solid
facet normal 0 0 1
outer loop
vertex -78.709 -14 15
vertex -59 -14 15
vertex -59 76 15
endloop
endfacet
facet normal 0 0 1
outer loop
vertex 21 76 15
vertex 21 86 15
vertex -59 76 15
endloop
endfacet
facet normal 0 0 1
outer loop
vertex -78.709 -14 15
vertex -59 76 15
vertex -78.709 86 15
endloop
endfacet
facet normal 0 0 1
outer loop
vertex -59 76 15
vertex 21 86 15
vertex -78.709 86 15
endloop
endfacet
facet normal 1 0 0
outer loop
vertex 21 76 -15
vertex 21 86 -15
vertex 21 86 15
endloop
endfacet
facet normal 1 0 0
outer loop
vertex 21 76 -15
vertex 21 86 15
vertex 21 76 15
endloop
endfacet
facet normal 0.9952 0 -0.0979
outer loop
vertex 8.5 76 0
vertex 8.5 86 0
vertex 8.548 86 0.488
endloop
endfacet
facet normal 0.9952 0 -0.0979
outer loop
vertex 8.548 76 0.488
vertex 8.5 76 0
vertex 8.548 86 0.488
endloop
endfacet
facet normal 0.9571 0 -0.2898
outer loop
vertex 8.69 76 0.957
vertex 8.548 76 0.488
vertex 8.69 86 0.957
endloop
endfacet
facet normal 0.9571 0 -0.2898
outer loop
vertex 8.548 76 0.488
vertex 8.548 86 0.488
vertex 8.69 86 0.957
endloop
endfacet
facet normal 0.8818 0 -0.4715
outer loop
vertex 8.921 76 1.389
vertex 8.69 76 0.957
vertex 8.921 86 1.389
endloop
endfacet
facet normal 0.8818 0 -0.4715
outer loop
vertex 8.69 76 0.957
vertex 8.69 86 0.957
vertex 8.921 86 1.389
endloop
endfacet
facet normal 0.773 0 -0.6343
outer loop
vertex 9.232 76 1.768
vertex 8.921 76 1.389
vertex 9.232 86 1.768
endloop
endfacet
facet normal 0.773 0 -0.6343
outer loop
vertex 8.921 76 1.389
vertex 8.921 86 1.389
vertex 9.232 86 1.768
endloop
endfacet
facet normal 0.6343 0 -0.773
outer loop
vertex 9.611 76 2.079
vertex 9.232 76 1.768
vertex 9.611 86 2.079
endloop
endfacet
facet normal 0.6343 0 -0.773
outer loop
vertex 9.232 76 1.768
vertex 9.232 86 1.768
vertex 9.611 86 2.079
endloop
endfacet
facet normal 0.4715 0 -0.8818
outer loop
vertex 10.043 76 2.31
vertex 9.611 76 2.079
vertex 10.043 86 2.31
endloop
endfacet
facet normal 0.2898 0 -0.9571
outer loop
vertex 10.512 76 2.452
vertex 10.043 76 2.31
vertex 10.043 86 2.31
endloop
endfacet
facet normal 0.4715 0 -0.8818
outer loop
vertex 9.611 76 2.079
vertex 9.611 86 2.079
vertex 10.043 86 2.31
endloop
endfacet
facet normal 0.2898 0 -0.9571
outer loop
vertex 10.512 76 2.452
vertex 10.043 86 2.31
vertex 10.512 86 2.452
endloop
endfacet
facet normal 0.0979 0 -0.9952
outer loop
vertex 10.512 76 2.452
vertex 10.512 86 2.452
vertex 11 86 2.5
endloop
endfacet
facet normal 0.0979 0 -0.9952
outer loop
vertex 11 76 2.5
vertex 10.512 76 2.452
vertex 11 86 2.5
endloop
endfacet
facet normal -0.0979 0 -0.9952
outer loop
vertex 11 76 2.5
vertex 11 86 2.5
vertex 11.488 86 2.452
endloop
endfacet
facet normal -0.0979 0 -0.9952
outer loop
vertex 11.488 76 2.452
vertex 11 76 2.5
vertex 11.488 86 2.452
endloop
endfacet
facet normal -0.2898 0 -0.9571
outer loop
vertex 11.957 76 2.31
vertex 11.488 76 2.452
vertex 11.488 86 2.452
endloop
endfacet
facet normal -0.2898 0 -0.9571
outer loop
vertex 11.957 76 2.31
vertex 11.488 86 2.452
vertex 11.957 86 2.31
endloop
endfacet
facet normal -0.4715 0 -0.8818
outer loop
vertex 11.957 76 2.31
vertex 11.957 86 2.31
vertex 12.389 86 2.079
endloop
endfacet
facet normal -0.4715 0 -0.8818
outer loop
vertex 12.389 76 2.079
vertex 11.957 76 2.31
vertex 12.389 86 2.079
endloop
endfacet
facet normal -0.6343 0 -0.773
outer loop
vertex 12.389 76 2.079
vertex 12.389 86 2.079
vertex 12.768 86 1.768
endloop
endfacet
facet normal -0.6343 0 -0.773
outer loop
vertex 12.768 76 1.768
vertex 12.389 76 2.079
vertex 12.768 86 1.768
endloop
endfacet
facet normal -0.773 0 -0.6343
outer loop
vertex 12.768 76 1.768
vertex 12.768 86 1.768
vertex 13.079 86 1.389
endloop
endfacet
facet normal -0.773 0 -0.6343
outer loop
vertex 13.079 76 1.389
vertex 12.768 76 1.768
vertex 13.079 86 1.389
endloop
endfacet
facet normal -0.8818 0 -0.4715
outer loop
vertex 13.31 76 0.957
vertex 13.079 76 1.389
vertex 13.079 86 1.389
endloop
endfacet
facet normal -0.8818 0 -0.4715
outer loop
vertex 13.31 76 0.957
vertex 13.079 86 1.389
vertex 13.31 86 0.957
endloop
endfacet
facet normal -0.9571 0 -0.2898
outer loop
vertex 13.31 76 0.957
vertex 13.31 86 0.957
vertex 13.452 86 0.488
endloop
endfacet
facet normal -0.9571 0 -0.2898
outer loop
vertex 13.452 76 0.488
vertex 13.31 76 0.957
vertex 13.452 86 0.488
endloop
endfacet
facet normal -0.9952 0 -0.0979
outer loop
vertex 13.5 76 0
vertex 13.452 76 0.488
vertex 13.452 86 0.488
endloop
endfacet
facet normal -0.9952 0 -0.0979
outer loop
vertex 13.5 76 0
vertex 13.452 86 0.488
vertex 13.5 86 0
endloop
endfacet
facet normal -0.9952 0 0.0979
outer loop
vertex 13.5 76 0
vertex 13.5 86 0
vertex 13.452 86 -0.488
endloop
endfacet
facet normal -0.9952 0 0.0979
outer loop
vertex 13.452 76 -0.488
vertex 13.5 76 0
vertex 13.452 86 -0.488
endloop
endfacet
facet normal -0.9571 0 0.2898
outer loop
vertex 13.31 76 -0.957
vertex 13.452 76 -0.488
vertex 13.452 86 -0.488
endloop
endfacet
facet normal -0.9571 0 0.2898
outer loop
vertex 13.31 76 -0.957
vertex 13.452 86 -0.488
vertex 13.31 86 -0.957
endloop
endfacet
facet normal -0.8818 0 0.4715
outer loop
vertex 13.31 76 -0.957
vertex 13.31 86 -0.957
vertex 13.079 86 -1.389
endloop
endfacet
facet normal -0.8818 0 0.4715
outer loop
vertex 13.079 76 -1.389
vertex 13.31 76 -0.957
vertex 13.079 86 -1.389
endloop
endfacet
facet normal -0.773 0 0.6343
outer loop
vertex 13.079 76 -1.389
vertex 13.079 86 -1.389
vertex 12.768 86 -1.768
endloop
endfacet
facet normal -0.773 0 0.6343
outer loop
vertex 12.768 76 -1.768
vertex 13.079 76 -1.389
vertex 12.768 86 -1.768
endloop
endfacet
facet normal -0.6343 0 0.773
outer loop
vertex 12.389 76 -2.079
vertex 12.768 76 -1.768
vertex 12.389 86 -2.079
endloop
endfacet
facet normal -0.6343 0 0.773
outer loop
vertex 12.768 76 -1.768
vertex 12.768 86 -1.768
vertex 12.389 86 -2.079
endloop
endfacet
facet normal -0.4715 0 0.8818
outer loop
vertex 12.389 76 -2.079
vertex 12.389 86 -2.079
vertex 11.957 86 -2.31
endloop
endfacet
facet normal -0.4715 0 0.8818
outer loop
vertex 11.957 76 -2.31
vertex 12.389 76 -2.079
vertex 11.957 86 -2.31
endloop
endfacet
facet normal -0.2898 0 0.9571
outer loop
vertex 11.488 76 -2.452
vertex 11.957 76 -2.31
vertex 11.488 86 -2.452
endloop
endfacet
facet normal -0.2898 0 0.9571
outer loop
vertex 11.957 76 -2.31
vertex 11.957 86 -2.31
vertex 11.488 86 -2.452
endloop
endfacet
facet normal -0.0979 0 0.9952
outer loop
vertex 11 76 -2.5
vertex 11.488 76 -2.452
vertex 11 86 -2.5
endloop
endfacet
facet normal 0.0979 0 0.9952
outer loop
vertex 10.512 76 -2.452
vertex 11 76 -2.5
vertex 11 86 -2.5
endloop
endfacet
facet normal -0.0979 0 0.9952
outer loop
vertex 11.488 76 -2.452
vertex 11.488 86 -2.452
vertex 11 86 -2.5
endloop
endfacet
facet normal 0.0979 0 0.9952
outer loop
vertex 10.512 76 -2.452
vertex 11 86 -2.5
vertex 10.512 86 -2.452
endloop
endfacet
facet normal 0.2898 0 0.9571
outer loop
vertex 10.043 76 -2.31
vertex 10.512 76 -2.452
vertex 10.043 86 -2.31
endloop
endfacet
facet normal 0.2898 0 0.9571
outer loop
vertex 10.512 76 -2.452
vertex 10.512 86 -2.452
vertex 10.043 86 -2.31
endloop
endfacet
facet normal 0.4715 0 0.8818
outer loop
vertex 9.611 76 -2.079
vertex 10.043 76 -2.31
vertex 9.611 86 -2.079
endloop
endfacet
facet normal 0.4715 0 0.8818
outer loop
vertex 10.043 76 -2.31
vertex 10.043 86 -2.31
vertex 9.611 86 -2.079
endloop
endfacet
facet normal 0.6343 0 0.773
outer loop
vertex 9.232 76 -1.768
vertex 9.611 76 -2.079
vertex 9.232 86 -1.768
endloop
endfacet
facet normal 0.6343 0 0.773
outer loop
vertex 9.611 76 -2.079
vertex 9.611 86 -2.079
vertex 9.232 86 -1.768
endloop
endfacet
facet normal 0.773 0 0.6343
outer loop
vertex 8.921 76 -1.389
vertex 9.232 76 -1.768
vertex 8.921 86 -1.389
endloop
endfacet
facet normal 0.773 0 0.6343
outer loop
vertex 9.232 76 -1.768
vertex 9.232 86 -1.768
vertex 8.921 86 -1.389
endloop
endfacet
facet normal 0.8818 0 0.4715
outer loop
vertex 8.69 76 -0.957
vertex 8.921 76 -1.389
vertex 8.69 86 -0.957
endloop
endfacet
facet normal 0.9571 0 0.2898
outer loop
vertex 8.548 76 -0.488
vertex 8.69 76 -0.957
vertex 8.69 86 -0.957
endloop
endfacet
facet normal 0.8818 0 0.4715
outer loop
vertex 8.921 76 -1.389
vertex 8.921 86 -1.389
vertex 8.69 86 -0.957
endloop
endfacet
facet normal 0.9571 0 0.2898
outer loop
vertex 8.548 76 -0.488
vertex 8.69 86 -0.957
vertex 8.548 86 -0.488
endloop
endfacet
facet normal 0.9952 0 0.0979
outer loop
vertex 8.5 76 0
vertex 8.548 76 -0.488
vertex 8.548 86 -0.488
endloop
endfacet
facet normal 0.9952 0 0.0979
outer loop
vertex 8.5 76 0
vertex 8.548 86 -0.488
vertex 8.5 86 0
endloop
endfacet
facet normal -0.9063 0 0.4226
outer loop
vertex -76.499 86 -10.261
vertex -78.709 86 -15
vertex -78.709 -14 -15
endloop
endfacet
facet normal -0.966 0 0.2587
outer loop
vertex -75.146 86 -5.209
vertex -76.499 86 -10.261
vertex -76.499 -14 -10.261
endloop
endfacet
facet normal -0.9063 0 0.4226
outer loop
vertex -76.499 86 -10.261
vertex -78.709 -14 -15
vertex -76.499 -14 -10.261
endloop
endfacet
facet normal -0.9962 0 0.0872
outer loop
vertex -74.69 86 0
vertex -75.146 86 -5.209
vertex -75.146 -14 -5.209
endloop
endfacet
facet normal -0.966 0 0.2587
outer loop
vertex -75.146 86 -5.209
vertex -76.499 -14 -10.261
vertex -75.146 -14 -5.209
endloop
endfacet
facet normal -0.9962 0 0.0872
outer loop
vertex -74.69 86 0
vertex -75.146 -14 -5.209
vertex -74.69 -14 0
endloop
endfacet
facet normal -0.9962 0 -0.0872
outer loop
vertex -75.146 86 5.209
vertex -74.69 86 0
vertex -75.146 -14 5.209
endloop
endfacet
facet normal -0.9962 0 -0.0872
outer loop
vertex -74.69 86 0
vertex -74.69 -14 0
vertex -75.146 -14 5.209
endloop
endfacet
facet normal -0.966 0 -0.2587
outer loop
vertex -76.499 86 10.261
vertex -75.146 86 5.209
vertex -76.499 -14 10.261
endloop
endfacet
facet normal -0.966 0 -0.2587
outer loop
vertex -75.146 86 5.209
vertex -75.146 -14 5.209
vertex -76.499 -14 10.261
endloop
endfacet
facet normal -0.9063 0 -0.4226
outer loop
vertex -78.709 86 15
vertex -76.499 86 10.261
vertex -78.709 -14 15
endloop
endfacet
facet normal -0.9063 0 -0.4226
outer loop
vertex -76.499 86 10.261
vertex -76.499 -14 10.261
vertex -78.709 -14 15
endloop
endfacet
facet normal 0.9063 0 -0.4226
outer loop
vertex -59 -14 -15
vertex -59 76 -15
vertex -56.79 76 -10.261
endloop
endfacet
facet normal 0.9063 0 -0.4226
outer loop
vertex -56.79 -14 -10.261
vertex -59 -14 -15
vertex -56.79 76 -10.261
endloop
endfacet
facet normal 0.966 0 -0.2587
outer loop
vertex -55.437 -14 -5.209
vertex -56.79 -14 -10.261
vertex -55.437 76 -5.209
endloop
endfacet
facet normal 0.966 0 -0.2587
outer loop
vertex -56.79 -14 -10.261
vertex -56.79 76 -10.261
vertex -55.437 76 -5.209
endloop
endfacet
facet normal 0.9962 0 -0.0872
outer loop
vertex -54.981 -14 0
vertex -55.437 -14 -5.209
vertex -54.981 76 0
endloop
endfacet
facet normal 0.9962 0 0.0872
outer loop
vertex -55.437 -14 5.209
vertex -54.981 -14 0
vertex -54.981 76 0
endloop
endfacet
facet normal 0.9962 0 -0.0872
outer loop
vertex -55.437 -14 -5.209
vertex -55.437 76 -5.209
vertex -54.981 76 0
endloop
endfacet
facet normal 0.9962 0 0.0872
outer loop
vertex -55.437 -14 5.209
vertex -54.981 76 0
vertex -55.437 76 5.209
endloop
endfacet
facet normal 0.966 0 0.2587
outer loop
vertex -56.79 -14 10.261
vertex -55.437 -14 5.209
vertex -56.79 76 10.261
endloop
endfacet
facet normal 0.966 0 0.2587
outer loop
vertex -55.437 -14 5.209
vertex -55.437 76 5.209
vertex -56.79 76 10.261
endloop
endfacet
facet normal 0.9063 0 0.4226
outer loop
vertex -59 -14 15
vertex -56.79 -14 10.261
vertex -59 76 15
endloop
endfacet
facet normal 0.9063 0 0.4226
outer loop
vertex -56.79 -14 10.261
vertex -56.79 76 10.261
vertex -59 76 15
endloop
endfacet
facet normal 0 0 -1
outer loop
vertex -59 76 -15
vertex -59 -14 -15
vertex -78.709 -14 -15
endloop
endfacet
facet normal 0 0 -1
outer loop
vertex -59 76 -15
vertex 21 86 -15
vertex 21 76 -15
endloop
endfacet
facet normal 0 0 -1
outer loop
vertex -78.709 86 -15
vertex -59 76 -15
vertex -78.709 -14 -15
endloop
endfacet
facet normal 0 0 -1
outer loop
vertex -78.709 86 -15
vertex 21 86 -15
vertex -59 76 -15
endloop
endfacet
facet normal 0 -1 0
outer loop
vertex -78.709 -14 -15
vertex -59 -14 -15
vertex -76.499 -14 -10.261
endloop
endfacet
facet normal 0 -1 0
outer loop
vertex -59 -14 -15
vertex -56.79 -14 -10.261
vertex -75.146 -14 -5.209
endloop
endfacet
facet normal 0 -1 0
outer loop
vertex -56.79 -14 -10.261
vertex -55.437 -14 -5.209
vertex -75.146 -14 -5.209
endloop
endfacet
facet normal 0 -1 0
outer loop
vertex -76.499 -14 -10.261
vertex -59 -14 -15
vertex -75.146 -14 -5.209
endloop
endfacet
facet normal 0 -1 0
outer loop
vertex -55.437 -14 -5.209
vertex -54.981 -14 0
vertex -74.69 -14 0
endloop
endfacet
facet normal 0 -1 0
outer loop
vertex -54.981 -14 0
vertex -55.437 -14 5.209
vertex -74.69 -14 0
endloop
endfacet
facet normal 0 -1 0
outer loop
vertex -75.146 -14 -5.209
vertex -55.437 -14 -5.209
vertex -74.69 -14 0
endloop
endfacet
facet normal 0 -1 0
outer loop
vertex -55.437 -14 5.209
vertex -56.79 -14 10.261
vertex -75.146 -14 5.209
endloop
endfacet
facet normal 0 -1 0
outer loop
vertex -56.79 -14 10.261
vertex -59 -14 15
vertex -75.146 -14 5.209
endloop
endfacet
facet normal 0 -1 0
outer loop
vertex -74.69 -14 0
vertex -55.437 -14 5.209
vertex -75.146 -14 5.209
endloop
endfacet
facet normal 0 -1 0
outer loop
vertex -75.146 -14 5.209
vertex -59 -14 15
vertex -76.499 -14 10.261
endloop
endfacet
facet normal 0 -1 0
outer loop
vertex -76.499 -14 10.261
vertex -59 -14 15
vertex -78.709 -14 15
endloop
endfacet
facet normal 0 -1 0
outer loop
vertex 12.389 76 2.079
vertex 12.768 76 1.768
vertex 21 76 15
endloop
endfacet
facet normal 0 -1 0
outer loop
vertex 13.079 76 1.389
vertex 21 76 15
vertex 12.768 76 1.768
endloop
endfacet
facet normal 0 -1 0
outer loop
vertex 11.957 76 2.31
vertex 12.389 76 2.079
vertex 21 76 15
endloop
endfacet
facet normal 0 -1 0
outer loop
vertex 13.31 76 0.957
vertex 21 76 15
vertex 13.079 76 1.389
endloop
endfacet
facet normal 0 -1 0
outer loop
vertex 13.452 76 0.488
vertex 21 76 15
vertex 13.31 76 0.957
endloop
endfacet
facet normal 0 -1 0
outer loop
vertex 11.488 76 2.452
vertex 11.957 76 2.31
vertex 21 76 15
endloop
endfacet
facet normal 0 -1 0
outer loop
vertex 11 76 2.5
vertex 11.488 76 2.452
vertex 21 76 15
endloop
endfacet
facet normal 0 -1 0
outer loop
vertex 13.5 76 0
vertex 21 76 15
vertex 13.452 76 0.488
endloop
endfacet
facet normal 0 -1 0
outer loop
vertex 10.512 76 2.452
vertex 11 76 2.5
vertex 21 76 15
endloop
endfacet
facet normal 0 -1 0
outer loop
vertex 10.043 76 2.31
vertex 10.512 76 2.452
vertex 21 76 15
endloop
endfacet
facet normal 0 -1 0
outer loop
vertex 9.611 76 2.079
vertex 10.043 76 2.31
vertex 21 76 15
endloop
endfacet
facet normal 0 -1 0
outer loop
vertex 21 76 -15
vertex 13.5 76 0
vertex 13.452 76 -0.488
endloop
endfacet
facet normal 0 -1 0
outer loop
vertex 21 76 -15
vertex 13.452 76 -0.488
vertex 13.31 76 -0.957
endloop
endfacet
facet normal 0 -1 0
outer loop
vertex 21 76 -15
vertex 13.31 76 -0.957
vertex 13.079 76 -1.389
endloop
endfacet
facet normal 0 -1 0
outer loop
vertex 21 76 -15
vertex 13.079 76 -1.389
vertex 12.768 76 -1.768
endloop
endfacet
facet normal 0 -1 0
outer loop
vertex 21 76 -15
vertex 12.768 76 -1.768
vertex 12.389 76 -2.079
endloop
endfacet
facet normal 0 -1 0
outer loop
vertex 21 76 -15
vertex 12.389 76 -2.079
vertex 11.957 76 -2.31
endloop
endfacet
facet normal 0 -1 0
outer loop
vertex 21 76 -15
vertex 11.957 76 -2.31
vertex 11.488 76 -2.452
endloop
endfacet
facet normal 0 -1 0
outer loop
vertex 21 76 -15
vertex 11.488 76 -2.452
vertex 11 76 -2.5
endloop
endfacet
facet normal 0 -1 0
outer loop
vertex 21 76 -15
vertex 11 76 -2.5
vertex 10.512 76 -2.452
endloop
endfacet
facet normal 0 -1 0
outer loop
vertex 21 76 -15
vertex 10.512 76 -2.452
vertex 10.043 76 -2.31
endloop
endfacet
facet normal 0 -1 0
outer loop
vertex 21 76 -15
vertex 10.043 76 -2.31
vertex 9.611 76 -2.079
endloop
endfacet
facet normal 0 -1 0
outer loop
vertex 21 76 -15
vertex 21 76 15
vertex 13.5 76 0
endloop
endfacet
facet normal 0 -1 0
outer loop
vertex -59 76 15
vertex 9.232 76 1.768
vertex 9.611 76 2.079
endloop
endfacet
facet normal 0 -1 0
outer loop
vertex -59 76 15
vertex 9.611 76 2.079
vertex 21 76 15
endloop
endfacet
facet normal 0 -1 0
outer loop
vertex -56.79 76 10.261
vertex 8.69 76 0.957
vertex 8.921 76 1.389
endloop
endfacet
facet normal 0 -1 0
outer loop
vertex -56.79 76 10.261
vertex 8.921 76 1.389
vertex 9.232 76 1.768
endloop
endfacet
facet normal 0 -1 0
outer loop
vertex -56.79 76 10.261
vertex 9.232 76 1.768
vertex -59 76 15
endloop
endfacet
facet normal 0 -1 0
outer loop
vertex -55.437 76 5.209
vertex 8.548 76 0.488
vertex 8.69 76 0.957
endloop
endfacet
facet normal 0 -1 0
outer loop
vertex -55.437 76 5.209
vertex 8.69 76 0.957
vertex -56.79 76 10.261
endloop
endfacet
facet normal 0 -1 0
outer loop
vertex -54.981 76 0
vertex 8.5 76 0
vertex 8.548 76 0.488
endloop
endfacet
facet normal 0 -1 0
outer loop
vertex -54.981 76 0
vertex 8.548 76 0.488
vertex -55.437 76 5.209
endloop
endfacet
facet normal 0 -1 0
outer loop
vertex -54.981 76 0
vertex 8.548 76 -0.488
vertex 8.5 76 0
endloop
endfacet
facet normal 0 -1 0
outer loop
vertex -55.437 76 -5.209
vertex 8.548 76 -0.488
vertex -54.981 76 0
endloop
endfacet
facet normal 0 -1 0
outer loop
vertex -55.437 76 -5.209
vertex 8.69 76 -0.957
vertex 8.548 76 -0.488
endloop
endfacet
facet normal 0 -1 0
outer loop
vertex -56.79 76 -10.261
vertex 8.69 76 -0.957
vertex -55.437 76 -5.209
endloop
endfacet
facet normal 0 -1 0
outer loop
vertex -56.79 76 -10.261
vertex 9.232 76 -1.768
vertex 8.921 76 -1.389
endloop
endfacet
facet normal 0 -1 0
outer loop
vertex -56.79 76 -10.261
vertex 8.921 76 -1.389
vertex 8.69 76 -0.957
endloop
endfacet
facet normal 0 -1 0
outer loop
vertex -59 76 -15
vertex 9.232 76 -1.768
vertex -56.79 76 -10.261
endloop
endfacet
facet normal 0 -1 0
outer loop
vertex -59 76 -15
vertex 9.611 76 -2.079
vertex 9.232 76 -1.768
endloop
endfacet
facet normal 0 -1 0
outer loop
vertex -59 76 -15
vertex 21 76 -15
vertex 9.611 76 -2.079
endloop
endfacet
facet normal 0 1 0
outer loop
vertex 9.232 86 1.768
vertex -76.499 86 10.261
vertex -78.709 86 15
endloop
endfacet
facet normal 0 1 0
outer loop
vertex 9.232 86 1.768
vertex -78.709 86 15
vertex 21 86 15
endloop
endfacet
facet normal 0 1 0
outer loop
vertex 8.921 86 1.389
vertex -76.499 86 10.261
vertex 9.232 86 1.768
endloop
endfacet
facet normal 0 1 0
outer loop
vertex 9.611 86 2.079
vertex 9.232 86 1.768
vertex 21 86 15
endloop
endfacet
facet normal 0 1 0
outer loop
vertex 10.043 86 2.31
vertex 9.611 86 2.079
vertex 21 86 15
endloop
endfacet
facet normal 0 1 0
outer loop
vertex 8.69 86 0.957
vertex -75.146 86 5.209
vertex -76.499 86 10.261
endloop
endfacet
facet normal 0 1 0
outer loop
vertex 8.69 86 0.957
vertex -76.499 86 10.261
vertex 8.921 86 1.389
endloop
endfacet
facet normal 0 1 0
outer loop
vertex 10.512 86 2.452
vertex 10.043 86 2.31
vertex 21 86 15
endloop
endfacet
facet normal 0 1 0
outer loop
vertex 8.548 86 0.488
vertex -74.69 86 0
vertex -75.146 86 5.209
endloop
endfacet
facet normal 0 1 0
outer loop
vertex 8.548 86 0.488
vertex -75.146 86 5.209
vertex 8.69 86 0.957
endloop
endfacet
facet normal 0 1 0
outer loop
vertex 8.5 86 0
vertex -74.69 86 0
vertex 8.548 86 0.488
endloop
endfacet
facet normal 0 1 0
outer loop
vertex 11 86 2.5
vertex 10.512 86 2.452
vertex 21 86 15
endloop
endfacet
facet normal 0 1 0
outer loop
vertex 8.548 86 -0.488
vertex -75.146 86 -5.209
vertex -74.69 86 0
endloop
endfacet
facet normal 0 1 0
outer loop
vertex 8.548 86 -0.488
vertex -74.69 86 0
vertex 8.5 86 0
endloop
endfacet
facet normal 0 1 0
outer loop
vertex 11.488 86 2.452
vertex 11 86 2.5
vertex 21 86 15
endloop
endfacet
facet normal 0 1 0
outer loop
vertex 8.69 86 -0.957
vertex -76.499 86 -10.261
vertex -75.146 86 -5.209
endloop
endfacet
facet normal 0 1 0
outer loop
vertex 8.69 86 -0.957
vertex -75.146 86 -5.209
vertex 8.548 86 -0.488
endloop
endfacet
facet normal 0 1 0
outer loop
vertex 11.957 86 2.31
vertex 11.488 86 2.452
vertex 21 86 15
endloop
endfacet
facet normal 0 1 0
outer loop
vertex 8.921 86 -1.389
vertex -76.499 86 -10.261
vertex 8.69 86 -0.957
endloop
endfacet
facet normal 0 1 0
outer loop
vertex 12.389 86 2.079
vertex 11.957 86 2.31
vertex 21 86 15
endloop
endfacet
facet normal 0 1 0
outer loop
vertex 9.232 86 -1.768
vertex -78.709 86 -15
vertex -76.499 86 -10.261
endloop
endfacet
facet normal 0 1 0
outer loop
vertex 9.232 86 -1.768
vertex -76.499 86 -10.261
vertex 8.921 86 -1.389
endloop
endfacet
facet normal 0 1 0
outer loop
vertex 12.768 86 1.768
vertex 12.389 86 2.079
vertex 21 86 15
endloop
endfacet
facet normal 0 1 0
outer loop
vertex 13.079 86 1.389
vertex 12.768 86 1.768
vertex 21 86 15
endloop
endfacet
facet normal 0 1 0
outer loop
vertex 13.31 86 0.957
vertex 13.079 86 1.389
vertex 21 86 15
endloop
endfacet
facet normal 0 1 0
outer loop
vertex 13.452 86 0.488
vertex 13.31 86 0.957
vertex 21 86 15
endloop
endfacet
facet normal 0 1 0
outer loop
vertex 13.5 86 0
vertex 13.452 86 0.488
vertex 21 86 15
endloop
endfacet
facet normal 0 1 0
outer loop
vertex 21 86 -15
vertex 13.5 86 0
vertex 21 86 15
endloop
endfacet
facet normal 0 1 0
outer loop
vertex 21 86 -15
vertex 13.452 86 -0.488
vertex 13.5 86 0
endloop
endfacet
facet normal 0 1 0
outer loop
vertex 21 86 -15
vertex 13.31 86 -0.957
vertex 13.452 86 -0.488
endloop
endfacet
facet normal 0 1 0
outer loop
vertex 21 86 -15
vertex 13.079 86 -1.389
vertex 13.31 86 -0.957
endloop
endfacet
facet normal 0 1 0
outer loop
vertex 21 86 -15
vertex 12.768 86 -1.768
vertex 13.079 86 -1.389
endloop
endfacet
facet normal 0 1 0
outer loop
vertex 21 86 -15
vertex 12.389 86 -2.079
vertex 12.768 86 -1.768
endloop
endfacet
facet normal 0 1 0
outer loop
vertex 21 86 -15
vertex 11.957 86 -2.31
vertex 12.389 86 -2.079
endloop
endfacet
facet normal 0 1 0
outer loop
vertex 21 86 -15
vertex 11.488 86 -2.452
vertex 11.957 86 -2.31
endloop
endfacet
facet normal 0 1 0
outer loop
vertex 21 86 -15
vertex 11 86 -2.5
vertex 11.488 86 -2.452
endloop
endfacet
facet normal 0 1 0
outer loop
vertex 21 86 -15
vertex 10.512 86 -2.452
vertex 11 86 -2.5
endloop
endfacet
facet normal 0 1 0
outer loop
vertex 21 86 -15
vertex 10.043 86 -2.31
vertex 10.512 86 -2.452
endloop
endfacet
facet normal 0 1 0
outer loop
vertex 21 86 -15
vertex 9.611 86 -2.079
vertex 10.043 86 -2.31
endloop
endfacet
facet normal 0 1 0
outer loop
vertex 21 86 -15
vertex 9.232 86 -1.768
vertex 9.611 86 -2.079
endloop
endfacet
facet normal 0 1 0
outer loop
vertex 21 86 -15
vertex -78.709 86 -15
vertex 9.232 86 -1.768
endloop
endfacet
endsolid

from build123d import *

# Parameters (mm, degrees)
PAD004_DEPTH    = 30
SKETCH018_R     = 2.5
POCKET007_DEPTH = 100.001
SKETCH019_R     = 30
POCKET008_DEPTH = 100.001
PAD005_DEPTH    = 90


with BuildPart() as part:
    # Sketch016 → Pad004 (new body)
    with BuildSketch(Plane.XY):
        Polygon((10, -50), (-10, -50), (-10, 50), (90, 50), (90, 40), (10, 40), align=None)
    extrude(amount=PAD004_DEPTH)

    # Sketch018 → Pocket007 (cut, through all)
    with BuildSketch(Plane(origin=(0, 50, 0), x_dir=(-1, 0, 0), z_dir=(0, 1, 0))):
        with Locations((-80, 15)):
            Circle(SKETCH018_R)
    extrude(amount=-POCKET007_DEPTH, mode=Mode.SUBTRACT)

    # Sketch019 (on Face1 of Pocket007) → Pocket008 (cut, through all)
    with BuildSketch(Plane.XZ.offset(50)):
        with Locations((-35.69, 15)):
            Circle(SKETCH019_R)
    extrude(amount=-POCKET008_DEPTH, mode=Mode.SUBTRACT)

    # Sketch020 (on Face7 of Pocket008) → Pad005 (join)
    with BuildSketch(Plane.XZ.offset(-40)):
        with BuildLine():
            Line((10, 0), (10, 30))
            ThreePointArc((10, 0), (14.019238, 15), (10, 30))
        make_face()
    extrude(amount=PAD005_DEPTH)


with BuildPart() as part_1:
    # Body005 placement: moved
    add(part.part.moved(Location((-69, 36, -15))))


solid = part_1.part
